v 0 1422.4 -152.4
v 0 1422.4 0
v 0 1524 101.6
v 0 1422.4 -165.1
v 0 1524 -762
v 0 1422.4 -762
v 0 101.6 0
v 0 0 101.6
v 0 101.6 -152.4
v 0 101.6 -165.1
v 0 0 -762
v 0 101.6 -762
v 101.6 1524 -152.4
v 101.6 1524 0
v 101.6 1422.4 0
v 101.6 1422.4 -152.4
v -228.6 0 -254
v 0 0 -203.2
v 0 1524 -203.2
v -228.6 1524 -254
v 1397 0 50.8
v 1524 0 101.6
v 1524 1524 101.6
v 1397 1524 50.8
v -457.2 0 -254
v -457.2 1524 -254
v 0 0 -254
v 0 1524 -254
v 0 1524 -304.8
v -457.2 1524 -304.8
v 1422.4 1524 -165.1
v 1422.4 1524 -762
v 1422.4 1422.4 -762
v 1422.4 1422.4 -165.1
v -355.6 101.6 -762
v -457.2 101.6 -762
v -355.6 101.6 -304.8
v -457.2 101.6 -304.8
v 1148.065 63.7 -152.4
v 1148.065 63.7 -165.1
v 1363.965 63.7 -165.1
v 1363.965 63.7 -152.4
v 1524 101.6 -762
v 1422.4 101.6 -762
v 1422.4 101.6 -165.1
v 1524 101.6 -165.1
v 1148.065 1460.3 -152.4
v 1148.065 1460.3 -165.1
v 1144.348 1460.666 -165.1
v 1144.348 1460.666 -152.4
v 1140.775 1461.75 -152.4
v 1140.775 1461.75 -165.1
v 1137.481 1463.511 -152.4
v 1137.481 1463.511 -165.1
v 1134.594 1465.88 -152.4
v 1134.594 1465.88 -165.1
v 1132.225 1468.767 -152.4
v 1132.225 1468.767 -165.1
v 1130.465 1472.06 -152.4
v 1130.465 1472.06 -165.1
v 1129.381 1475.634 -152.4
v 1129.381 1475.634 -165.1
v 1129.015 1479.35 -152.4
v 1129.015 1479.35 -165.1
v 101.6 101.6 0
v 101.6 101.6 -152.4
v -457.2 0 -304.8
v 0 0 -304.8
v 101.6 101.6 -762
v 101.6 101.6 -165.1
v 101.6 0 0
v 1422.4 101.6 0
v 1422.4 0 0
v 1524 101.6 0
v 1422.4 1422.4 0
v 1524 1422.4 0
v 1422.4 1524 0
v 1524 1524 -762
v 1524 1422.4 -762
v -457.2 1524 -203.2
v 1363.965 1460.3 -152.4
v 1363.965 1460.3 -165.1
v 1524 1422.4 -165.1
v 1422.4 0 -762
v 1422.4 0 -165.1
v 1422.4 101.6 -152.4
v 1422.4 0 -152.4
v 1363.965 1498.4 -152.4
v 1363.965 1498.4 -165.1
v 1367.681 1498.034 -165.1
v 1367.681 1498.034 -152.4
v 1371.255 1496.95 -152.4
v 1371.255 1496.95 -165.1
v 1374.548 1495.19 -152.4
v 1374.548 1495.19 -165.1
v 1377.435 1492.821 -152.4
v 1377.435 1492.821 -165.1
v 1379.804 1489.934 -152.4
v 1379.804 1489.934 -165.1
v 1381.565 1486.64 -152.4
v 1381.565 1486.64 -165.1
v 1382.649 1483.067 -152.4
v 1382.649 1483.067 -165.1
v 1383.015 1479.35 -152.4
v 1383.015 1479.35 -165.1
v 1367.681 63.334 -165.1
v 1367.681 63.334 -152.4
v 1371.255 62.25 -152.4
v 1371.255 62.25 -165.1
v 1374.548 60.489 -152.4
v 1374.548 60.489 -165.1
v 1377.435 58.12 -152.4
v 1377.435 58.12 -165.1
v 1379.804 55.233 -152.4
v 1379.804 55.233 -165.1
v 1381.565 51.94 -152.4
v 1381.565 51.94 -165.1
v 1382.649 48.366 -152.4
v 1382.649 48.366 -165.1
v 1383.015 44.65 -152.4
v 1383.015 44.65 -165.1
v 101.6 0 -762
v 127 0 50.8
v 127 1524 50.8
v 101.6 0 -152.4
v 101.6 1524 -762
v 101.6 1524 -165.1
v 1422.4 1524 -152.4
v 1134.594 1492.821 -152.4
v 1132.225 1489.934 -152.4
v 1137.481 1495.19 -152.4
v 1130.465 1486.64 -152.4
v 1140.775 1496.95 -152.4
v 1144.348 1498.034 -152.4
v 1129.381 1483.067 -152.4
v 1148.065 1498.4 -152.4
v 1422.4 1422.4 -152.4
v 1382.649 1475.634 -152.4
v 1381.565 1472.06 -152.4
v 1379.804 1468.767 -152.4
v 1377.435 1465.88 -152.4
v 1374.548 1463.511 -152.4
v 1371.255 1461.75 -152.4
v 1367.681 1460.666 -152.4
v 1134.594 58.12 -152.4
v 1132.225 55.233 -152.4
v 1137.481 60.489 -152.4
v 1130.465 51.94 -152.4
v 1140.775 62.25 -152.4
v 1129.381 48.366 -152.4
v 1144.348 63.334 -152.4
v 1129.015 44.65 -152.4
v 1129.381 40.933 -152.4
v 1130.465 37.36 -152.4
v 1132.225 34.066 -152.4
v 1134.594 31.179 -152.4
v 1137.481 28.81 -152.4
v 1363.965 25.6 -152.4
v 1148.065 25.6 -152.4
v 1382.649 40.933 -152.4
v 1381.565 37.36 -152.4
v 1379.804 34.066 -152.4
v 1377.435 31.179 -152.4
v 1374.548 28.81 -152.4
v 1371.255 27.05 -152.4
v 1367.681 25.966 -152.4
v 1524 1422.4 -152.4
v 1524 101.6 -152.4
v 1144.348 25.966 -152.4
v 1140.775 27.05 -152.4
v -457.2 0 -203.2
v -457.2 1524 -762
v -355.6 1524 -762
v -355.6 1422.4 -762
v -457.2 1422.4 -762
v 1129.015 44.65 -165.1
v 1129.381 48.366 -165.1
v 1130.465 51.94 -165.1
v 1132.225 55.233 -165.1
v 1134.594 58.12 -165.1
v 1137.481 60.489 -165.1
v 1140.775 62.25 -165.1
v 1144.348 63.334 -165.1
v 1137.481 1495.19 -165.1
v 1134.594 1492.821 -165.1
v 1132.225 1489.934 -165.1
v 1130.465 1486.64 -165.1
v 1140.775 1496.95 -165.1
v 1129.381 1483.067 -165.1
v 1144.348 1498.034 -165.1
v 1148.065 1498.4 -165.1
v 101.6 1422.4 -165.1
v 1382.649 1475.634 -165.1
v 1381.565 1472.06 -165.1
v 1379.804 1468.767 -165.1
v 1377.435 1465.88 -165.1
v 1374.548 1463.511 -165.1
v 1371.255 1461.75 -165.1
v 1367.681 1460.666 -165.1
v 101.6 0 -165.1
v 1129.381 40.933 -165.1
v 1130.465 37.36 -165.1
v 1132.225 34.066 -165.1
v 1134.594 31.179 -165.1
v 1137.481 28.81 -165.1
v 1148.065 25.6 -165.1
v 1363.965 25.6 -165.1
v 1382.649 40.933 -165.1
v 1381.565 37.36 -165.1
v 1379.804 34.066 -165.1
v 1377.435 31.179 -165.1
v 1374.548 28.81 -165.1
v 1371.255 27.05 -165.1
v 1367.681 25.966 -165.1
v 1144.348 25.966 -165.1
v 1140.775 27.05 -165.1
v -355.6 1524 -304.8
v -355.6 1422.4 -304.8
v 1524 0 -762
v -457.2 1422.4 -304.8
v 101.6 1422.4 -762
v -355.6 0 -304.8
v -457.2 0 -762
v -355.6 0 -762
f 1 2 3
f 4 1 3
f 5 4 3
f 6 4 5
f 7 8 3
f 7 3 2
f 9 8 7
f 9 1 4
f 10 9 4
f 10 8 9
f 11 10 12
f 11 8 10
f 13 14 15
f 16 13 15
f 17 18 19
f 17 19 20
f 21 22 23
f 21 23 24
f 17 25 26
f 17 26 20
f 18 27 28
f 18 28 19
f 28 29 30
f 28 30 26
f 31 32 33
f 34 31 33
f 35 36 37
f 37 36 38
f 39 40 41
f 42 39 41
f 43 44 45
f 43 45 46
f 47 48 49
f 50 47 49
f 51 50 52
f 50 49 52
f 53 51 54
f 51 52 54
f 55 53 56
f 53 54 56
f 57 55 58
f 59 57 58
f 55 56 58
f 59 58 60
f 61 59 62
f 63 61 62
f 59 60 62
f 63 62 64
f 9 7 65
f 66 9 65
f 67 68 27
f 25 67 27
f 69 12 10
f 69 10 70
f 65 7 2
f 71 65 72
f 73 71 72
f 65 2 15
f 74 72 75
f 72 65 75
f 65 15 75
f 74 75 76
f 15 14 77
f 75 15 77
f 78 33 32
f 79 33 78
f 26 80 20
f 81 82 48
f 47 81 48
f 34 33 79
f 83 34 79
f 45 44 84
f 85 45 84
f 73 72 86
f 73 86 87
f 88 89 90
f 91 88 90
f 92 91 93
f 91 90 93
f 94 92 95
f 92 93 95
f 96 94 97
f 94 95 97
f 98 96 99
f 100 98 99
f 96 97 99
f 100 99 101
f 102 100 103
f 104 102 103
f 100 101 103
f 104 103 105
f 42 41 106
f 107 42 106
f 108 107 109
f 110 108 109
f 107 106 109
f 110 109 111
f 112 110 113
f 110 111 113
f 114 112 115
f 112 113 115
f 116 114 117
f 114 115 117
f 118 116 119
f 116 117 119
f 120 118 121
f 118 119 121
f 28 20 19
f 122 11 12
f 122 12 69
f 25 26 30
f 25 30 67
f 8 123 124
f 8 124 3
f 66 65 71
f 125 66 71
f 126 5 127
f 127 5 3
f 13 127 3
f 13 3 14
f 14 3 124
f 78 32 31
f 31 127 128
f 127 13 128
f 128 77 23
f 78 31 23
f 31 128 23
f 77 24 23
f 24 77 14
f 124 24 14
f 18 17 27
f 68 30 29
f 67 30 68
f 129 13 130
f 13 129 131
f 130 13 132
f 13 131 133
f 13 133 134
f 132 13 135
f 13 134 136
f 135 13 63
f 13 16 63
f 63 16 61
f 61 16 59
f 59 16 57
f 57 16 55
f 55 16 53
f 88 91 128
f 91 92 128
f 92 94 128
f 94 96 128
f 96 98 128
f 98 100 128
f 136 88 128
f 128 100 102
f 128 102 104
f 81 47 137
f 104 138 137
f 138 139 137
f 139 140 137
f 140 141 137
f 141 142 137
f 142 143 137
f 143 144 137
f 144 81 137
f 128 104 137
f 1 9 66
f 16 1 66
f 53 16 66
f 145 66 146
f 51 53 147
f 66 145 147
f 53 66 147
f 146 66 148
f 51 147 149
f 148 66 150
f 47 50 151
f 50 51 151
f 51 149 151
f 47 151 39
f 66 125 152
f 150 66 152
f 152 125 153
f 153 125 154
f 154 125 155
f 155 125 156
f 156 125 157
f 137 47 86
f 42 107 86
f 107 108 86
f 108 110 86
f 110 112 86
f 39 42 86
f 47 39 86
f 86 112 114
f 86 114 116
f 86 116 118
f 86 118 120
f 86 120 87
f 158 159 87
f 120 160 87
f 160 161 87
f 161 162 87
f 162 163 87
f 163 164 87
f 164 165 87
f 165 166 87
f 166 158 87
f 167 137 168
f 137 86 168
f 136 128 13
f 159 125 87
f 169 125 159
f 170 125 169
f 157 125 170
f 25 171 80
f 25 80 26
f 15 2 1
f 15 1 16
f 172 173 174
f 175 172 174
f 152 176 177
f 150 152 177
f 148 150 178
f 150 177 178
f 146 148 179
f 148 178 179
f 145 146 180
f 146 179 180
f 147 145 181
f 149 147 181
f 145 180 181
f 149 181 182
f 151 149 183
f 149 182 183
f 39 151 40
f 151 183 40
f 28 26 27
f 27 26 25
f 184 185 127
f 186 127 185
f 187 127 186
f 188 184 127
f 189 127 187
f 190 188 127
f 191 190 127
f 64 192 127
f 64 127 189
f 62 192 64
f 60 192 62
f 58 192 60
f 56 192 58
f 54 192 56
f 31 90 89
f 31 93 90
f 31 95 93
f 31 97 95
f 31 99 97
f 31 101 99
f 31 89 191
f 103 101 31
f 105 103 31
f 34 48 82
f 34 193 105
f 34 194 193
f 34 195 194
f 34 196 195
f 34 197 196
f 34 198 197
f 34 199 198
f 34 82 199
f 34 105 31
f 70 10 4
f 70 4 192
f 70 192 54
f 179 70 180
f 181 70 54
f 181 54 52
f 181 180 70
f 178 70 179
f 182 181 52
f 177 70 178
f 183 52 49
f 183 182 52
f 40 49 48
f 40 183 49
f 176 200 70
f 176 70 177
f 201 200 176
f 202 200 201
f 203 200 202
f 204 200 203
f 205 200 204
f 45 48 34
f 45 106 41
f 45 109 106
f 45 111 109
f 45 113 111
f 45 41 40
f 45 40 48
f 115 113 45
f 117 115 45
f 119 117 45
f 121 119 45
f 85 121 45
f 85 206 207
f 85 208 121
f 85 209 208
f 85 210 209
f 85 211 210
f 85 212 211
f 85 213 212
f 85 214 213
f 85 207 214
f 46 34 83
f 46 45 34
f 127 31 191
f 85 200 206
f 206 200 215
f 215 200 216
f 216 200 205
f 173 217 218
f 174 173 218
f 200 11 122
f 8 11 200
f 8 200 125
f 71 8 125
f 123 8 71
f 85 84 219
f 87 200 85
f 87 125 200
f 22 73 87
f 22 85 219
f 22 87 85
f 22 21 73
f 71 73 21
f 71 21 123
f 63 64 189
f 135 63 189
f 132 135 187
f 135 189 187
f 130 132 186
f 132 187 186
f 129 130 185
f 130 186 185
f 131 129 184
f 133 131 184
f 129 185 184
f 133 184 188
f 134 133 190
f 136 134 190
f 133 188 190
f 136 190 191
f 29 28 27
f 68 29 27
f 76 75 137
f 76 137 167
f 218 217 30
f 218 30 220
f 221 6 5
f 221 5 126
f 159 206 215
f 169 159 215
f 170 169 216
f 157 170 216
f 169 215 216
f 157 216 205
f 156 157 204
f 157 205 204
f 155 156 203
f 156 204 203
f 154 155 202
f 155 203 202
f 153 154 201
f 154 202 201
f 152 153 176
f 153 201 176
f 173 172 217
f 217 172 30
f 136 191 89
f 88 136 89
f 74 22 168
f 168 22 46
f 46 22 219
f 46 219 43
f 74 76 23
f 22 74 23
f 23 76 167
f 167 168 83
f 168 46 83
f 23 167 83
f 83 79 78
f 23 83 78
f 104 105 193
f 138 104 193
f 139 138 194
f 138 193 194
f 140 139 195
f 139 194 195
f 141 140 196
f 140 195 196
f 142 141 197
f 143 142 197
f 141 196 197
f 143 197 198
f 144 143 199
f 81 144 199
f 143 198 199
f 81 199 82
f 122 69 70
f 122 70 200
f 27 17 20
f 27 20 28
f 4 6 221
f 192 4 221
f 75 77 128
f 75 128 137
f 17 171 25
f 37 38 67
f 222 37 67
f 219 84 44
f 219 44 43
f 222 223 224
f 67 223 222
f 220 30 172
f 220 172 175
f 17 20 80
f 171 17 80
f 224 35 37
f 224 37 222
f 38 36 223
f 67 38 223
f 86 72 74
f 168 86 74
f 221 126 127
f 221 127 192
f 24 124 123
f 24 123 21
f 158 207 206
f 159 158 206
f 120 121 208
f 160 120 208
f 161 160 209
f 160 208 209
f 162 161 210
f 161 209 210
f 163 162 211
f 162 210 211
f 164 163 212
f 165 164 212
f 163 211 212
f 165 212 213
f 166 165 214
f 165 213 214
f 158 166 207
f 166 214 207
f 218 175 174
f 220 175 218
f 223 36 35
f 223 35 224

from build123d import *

# Parameters (mm, degrees)
F0_W      = 1524
F0_H      = 1524
F1_DEPTH  = 50.8
F2_W      = 101.6
F2_H      = 101.6
F3_DEPTH  = 762
F4_W      = 1524
F4_H      = 12.7
F5_DEPTH  = 1524
F7_DEPTH  = 25.4
F9_DEPTH  = 1524
F11_W     = 101.6
F11_H     = 457.2
F12_DEPTH = 101.6
F13_W     = 1524
F13_H     = 50.8
F14_DEPTH = 457.2
F16_DEPTH = 1524


with BuildPart() as f1:
    # F0 (on Top) → F1 (new body)
    with BuildSketch(Plane.XY):
        with Locations((762, 762)):
            Rectangle(F0_W, F0_H)
    extrude(amount=F1_DEPTH)

    # F2 (on face) → F3 (join)
    with BuildSketch(Plane(origin=(0, 0, 0), x_dir=(1, 0, 0), z_dir=(0, 0, -1))):
        with Locations((50.8, -50.8)):
            Rectangle(F2_W, F2_H)
        with Locations((1473.2, -50.8)):
            Rectangle(F2_W, F2_H)
        with Locations((1473.2, -1473.2)):
            Rectangle(F2_W, F2_H)
        with Locations((50.8, -1473.2)):
            Rectangle(F2_W, F2_H)
    extrude(amount=F3_DEPTH)

    # F4 (on Front) → F5 (join)
    with BuildSketch(Plane.XZ):
        with Locations((762, -158.75)):
            Rectangle(F4_W, F4_H)
    extrude(amount=-F5_DEPTH)

    # F6 (on face) → F7 (cut)
    with BuildSketch(Plane(origin=(0, 0, -165.1), x_dir=(1, 0, 0), z_dir=(0, 0, -1))):
        with BuildLine():
            Line((1363.9646789551, -25.5996988535), (1148.0646789551, -25.5996988535))
            ThreePointArc((1148.0646789551, -25.5996988535), (1134.5942947735, -31.1793146719), (1129.0146789551, -44.6496988535))
            ThreePointArc((1129.0146789551, -44.6496988535), (1134.5942947735, -58.1200830351), (1148.0646789551, -63.6996988535))
            Line((1148.0646789551, -63.6996988535), (1363.9646789551, -63.6996988535))
            ThreePointArc((1363.9646789551, -63.6996988535), (1377.4350631367, -58.1200830351), (1383.0146789551, -44.6496988535))
            ThreePointArc((1383.0146789551, -44.6496988535), (1377.4350631367, -31.1793146719), (1363.9646789551, -25.5996988535))
        make_face()
        with BuildLine():
            Line((1363.9646789551, -1460.3003011465), (1148.0646789551, -1460.3003011465))
            ThreePointArc((1148.0646789551, -1460.3003011465), (1134.5942947735, -1465.8799169649), (1129.0146789551, -1479.3503011465))
            ThreePointArc((1129.0146789551, -1479.3503011465), (1134.5942947735, -1492.8206853281), (1148.0646789551, -1498.4003011465))
            Line((1148.0646789551, -1498.4003011465), (1363.9646789551, -1498.4003011465))
            ThreePointArc((1363.9646789551, -1498.4003011465), (1377.4350631367, -1492.8206853281), (1383.0146789551, -1479.3503011465))
            ThreePointArc((1383.0146789551, -1479.3503011465), (1377.4350631367, -1465.8799169649), (1363.9646789551, -1460.3003011465))
        make_face()
    extrude(amount=-F7_DEPTH, mode=Mode.SUBTRACT)

    # F8 (on Front) → F9 (join)
    with BuildSketch(Plane.XZ):
        Polygon((0, 101.6), (0, 50.8), (127, 50.8), align=None)
        Polygon((1524, 101.6), (1397, 50.8), (1524, 50.8), align=None)
    extrude(amount=-F9_DEPTH)


with BuildPart() as f12:
    # F11 (on offset) → F12 (new body)
    with BuildSketch(Plane(origin=(-457.2, 0, 0), x_dir=(0, -1, 0), z_dir=(-1, 0, 0))):
        with Locations((-50.8, -533.4)):
            Rectangle(F11_W, F11_H)
    extrude(amount=-F12_DEPTH)


with BuildPart() as f12b:
    # F11 (on offset) → F12, piece 2 (new body)
    with BuildSketch(Plane(origin=(-457.2, 0, 0), x_dir=(0, -1, 0), z_dir=(-1, 0, 0))):
        with Locations((-1473.2, -533.4)):
            Rectangle(F11_W, F11_H)
    extrude(amount=-F12_DEPTH)


with BuildPart() as f14:
    # F13 (on offset) → F14 (new body)
    with BuildSketch(Plane(origin=(-457.2, 0, 0), x_dir=(0, -1, 0), z_dir=(-1, 0, 0))):
        with Locations((-762, -279.4)):
            Rectangle(F13_W, F13_H)
    extrude(amount=-F14_DEPTH)


with BuildPart() as f16:
    # F15 (on face) → F16 (new body)
    with BuildSketch(Plane.XZ):
        Polygon((0, -203.2), (-228.6, -254), (0, -254), align=None)
    extrude(amount=-F16_DEPTH)


with BuildPart() as f16b:
    # F15 (on face) → F16, piece 2 (new body)
    with BuildSketch(Plane.XZ):
        Polygon((-457.2, -203.2), (-457.2, -254), (-228.6, -254), align=None)
    extrude(amount=-F16_DEPTH)


solid = Compound([f1.part, f12.part, f12b.part, f14.part, f16.part, f16b.part])
